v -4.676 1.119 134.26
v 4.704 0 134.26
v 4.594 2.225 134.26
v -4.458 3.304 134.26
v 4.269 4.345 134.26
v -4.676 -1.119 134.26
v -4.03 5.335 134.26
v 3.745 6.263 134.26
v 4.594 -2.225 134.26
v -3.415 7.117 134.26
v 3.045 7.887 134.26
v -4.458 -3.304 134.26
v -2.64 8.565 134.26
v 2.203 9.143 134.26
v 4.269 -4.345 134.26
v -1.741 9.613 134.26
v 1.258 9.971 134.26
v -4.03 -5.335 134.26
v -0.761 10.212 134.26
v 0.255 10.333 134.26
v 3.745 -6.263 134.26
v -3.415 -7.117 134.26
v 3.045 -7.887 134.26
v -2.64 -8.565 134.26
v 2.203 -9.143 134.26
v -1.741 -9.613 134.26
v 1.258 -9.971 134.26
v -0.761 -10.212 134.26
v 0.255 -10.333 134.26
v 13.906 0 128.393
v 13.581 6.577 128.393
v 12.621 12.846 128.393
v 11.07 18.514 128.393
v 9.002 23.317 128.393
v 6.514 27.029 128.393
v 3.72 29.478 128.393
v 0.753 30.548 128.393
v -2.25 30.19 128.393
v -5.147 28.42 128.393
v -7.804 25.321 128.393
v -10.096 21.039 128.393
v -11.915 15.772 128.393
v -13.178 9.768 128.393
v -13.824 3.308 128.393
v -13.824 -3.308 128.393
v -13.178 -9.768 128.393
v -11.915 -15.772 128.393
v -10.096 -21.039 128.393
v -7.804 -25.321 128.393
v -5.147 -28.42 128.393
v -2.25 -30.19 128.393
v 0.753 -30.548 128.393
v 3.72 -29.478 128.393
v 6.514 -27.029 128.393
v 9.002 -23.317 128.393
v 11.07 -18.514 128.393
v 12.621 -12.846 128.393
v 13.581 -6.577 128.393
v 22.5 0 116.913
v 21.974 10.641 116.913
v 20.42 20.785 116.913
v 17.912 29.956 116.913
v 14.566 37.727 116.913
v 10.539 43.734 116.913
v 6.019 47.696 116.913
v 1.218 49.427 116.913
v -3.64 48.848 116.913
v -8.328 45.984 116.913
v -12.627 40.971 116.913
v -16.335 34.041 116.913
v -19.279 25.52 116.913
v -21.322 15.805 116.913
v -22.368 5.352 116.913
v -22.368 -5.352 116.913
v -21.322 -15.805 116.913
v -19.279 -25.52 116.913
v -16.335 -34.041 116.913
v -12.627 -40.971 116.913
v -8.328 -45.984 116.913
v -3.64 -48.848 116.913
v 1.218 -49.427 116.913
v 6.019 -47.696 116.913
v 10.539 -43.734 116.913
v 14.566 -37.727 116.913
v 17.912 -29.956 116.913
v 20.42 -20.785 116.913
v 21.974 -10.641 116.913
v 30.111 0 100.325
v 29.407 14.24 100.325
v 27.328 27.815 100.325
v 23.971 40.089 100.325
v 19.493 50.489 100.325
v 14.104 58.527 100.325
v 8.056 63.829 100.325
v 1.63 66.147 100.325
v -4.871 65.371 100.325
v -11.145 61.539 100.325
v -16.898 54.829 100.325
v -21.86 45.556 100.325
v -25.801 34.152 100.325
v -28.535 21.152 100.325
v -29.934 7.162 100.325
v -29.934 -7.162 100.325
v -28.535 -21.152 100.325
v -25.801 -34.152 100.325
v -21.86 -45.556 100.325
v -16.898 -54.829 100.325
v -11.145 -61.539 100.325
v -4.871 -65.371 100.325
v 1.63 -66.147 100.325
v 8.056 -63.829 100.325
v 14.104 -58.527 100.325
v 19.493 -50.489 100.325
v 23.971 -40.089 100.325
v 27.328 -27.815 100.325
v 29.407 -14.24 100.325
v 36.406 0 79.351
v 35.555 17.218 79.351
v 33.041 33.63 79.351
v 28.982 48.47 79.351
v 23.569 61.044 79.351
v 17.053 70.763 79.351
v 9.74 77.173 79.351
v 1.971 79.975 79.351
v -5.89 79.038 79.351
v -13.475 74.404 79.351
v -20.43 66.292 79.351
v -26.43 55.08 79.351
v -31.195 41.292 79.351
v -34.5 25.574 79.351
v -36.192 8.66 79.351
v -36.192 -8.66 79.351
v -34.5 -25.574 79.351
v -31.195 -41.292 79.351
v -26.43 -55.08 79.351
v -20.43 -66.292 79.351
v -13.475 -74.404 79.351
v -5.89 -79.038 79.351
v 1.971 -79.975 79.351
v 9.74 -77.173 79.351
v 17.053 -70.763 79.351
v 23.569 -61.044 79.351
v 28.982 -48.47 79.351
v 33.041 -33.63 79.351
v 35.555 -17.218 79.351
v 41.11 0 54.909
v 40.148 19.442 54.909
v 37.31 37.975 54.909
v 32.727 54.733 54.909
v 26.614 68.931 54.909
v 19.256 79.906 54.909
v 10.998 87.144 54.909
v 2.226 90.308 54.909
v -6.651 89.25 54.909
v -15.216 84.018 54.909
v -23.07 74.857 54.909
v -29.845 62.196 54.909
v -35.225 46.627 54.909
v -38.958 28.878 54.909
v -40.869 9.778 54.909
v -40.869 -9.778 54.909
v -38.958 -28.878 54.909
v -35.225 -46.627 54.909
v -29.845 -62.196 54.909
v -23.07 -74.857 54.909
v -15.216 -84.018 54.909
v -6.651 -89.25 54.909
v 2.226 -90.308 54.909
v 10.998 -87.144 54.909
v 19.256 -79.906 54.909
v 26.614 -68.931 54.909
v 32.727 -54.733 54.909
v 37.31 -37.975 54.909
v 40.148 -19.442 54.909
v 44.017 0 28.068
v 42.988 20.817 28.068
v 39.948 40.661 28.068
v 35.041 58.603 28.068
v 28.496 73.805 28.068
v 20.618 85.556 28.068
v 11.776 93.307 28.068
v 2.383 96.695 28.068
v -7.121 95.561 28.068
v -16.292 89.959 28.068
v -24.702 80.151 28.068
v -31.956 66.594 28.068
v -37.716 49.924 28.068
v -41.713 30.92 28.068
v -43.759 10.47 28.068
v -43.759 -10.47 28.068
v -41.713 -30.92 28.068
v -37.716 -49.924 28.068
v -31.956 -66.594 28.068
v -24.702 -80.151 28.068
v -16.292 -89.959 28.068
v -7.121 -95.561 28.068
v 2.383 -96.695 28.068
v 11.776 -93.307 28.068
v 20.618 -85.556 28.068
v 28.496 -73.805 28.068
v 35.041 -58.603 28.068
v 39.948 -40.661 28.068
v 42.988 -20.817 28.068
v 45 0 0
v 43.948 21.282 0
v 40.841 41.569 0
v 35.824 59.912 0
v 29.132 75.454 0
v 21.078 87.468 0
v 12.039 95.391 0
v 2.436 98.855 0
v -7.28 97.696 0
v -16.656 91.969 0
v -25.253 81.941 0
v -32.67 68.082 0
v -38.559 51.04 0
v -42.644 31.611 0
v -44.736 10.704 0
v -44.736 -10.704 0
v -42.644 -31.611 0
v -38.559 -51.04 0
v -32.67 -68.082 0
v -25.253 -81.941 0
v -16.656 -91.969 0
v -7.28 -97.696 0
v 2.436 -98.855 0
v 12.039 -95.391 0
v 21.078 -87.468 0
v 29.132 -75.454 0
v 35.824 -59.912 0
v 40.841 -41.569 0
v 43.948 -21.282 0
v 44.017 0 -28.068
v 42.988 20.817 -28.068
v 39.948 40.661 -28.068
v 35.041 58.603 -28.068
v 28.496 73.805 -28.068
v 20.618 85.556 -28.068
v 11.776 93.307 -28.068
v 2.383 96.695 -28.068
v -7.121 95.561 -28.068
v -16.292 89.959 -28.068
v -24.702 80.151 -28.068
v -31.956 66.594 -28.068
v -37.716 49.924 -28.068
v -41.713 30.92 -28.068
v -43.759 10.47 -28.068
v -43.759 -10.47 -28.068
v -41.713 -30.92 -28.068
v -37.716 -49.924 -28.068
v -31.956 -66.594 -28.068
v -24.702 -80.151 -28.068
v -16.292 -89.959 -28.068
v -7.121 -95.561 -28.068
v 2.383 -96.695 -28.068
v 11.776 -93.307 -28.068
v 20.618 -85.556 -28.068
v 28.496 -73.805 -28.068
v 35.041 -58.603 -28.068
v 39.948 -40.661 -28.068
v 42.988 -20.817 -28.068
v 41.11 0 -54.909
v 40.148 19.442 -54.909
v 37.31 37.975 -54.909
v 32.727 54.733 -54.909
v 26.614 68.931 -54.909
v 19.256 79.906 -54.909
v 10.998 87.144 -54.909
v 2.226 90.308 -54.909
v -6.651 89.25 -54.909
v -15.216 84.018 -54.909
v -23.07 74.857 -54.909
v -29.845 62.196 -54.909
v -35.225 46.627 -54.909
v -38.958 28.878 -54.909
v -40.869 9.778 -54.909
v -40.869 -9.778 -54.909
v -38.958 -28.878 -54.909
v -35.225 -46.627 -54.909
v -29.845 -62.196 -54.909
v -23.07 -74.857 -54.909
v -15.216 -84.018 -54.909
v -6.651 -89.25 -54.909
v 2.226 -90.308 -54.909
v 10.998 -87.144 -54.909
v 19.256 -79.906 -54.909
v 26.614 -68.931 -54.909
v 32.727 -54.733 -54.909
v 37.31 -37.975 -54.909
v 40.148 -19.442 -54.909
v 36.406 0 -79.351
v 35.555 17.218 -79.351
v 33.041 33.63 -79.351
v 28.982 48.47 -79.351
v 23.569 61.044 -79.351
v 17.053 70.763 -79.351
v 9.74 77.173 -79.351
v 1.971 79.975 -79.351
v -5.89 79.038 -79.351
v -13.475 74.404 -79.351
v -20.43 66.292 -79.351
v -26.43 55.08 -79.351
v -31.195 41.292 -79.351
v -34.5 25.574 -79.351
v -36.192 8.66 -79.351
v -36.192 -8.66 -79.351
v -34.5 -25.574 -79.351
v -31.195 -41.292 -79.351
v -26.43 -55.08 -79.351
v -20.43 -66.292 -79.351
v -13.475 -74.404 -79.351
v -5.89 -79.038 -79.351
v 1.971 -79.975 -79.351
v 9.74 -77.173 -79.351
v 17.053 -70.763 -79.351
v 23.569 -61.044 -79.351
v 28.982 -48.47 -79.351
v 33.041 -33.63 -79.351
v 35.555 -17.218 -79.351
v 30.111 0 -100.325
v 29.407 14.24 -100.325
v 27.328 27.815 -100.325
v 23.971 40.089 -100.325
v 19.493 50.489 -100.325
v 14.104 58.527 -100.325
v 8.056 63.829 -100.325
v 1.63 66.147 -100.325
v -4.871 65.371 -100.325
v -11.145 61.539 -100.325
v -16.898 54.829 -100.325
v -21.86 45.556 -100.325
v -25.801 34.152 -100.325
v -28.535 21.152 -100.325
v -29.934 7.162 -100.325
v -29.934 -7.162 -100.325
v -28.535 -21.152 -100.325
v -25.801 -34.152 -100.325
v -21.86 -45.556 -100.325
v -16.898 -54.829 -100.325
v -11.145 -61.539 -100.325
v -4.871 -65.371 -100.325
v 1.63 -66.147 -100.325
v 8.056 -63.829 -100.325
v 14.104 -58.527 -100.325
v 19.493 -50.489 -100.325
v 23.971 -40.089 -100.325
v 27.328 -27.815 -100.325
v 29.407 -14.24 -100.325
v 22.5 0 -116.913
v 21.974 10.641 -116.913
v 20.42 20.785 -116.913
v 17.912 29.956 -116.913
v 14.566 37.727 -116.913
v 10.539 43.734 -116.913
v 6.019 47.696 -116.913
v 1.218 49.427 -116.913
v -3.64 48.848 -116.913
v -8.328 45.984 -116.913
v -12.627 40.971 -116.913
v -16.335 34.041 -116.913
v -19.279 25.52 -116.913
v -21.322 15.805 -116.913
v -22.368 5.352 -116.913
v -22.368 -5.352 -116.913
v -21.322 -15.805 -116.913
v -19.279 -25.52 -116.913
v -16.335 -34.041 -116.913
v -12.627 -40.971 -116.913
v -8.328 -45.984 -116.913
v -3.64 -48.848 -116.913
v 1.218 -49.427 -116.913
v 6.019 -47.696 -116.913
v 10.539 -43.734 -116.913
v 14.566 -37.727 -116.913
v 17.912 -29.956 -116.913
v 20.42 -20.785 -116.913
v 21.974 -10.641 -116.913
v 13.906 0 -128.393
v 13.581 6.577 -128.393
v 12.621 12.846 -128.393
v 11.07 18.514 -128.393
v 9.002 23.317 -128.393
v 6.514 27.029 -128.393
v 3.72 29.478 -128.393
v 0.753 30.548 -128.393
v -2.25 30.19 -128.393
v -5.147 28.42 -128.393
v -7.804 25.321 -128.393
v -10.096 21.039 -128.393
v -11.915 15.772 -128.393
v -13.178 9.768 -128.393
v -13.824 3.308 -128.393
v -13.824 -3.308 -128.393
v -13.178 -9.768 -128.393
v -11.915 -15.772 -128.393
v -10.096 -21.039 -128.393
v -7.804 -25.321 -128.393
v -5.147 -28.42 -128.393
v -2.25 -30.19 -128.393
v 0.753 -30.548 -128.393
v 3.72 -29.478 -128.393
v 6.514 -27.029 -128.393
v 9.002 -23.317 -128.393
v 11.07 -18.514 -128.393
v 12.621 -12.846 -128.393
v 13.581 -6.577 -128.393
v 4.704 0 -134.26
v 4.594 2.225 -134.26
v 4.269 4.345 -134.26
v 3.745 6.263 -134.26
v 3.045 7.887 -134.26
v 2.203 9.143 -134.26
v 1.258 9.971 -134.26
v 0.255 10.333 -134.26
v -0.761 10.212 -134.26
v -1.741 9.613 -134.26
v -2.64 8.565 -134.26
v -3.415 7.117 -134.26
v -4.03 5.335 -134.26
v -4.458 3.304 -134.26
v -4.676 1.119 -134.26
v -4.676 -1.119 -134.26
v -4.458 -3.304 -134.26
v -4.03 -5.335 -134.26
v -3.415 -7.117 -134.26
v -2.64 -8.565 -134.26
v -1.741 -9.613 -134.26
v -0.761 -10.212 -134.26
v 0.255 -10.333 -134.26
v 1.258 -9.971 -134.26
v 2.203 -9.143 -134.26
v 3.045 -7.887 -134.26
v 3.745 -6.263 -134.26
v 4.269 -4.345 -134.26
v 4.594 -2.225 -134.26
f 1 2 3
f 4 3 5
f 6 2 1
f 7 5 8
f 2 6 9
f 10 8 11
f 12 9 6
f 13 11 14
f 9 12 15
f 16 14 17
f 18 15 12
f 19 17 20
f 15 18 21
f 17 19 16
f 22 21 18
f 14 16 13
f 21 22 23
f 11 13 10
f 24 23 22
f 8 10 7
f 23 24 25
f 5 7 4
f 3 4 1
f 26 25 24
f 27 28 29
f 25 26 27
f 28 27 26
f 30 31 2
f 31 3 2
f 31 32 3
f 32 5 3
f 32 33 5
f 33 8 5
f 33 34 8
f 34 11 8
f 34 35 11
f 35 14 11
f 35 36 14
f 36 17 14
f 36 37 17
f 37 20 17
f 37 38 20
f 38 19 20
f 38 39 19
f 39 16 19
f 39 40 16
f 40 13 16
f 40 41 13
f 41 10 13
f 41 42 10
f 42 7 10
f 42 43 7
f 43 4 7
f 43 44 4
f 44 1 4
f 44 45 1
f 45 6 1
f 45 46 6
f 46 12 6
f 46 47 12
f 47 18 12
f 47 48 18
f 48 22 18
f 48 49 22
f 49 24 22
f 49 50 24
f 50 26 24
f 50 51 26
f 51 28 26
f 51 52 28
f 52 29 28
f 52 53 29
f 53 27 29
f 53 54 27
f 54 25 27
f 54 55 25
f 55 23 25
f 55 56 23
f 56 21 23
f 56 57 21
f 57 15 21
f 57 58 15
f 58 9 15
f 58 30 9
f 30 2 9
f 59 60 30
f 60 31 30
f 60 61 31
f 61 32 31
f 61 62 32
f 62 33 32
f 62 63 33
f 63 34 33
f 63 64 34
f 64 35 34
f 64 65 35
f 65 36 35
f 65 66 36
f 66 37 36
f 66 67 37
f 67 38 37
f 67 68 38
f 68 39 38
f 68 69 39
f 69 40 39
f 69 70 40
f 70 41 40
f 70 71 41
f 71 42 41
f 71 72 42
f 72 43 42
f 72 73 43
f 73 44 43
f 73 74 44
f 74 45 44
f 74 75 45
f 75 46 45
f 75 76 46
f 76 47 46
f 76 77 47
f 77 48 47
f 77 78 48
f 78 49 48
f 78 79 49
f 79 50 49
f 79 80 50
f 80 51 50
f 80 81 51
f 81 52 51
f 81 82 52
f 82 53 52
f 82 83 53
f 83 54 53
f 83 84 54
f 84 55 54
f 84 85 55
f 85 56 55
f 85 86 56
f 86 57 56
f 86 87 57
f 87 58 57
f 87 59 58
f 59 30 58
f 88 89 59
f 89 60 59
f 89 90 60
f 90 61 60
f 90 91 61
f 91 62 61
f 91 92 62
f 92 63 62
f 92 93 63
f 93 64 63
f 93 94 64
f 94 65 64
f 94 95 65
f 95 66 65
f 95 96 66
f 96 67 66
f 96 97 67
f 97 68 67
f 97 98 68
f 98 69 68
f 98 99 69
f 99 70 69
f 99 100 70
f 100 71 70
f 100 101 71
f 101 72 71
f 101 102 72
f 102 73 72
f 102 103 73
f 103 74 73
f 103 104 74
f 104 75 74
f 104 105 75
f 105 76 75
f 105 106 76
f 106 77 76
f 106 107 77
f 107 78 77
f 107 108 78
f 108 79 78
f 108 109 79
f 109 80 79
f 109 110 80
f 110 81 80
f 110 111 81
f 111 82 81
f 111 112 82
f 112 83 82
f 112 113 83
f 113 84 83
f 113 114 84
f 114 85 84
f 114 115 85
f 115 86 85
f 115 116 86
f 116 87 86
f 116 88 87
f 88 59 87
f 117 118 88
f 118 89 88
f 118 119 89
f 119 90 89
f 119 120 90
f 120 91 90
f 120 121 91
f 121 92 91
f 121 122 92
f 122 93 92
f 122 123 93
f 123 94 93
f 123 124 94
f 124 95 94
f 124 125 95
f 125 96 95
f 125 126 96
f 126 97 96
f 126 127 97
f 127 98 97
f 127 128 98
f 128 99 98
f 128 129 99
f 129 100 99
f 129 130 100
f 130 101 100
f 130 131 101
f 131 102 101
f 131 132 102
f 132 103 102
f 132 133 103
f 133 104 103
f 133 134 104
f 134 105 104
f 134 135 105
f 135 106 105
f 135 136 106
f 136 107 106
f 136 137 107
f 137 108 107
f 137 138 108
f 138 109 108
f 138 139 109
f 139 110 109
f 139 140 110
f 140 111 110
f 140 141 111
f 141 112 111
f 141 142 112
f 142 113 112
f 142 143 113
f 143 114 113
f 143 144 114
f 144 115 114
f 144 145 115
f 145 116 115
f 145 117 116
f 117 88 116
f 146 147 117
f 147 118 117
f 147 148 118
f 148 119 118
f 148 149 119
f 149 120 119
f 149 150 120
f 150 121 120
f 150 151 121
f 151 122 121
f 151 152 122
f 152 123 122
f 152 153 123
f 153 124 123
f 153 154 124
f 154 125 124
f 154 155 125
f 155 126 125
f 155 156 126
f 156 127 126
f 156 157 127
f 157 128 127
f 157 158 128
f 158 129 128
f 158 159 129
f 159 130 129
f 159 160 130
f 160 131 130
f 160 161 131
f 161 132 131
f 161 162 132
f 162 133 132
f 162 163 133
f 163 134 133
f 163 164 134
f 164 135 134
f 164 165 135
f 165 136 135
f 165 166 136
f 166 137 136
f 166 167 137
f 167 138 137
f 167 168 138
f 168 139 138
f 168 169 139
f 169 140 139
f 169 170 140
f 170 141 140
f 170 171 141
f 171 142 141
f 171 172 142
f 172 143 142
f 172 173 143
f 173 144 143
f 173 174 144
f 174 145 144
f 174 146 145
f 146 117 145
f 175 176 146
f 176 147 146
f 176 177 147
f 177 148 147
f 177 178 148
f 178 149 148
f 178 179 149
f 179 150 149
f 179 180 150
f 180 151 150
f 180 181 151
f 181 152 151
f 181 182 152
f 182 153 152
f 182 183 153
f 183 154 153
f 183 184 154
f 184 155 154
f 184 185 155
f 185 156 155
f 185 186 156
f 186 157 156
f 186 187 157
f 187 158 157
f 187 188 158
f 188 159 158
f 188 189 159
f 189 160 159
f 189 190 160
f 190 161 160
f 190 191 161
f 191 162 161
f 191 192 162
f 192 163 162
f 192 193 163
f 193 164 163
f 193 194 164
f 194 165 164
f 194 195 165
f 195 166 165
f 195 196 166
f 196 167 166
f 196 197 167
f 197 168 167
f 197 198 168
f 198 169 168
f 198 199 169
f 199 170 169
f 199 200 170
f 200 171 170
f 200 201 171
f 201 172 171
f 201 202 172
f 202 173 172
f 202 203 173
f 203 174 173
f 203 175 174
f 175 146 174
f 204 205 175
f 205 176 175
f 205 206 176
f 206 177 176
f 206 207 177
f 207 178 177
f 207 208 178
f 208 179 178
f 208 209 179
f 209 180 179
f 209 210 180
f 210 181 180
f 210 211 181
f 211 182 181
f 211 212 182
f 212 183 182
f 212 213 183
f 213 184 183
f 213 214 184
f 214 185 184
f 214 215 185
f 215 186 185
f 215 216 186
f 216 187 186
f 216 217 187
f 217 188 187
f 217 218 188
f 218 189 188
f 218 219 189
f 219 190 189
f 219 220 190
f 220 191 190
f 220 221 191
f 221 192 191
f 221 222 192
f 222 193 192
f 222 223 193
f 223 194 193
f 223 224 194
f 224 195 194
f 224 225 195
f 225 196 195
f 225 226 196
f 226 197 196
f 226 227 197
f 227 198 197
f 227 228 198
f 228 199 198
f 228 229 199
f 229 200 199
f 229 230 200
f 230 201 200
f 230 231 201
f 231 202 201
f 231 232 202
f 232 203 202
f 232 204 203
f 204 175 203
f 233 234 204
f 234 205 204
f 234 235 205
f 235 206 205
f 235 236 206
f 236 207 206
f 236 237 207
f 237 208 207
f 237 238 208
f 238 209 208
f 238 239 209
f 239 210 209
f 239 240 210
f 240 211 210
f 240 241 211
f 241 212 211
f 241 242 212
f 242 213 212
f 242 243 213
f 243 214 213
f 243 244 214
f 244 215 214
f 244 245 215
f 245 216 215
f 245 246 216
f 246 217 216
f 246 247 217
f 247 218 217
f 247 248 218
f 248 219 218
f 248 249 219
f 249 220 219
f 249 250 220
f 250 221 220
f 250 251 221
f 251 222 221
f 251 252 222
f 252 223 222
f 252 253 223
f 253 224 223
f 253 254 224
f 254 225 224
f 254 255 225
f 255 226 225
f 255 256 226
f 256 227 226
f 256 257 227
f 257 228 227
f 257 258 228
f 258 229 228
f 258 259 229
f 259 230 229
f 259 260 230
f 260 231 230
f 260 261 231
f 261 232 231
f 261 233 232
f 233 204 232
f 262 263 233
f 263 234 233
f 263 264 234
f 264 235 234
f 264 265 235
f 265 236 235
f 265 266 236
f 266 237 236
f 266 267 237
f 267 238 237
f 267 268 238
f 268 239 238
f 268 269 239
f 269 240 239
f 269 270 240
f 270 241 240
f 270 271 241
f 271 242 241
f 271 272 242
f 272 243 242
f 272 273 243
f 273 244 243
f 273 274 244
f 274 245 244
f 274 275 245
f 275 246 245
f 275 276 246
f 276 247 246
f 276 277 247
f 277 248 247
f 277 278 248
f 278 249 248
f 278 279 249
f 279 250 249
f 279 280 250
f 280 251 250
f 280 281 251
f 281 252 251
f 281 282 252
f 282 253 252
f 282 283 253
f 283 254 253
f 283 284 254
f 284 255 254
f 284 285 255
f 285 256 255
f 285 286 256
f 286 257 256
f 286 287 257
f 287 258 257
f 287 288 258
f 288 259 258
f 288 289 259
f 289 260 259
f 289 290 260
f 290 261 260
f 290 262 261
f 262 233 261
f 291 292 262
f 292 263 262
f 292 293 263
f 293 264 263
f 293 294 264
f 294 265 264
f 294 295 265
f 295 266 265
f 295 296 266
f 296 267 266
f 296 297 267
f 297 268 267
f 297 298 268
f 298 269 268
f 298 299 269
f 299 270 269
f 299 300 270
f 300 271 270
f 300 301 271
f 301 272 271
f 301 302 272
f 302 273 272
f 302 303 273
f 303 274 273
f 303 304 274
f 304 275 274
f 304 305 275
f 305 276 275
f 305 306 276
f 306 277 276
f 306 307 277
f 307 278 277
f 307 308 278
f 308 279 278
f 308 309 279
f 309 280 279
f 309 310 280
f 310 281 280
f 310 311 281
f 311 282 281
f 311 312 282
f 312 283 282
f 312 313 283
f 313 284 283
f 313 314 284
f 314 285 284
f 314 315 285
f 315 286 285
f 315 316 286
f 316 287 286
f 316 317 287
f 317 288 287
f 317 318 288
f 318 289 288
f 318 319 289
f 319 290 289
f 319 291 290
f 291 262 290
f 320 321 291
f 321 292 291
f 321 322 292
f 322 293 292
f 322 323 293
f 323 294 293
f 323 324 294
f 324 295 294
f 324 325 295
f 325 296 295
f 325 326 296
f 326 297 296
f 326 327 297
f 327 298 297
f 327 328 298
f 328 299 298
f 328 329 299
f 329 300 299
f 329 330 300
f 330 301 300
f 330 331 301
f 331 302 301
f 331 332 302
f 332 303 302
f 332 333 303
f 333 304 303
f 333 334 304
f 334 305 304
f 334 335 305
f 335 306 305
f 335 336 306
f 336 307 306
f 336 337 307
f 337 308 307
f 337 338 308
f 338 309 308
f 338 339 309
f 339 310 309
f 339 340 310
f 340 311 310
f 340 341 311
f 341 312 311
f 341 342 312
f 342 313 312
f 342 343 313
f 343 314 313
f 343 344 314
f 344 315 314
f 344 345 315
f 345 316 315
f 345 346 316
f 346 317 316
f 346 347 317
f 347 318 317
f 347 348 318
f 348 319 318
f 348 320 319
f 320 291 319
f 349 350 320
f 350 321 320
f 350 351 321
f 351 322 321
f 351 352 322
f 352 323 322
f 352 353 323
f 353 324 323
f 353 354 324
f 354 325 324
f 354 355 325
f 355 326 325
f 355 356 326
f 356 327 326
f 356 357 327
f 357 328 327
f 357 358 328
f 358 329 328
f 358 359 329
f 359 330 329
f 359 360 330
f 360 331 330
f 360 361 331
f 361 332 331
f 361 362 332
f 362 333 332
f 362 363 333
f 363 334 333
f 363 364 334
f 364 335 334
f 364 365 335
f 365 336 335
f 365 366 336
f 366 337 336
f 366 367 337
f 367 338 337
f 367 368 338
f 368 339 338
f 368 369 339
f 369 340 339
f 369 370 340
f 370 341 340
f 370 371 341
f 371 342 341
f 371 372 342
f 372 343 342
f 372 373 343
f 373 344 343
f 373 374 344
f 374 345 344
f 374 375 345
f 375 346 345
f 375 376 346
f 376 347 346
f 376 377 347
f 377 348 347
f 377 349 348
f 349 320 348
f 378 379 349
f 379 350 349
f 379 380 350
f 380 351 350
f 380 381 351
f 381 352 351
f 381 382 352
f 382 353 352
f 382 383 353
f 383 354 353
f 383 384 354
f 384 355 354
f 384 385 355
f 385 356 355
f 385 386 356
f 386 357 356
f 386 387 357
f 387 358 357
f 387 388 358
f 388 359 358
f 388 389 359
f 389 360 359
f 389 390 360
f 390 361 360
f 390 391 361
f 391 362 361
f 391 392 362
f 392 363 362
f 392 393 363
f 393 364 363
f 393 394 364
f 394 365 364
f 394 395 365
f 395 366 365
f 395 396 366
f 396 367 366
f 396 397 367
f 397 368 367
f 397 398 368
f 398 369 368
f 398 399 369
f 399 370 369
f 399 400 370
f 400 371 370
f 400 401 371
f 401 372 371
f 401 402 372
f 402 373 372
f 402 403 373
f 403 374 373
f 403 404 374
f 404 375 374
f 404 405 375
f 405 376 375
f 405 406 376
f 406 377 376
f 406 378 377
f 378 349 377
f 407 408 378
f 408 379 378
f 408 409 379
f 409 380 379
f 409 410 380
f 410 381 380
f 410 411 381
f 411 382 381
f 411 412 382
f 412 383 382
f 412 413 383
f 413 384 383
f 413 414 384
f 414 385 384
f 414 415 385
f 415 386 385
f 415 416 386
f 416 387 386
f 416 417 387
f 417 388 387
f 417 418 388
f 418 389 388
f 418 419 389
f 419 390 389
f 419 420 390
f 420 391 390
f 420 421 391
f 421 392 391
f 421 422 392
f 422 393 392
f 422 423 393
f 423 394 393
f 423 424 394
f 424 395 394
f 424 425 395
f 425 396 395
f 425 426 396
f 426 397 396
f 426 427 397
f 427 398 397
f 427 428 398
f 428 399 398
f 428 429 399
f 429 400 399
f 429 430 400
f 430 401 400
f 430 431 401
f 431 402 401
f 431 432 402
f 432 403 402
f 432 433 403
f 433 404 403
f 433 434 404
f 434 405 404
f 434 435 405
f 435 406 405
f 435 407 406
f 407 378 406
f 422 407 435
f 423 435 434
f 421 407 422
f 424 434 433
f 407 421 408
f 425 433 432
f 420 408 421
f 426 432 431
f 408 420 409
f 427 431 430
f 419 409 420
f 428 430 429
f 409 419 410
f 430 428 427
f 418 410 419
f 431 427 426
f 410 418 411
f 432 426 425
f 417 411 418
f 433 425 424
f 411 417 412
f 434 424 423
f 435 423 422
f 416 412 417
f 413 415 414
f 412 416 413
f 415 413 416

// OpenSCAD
// Generated by SolidPython 1.0.1 on 2020-07-29 00:46:46


scale(v = [5, 11, 15]) {
	sphere(r = 9);
}
/***********************************************
*********      SolidPython code:      **********
************************************************
 
# import packages: SolidPython
from solid import *
from solid.utils import *
from itertools import chain, combinations, permutations


class Resize:

    def __init__(self, scad_file):
        self.scad_file = scad_file
        #self.scad_file = import_scad(scad_file)
        # cone/cylinder param:
        self.r1 = 0
        self.r2 = 0
        self.h = 0
        # rectangular prism param:
        self.w = 0
        self.l = 0
        # ellipse param:
        self.r = 0

    # import OpenScad code (file name corresponds to shape)


    # classify shape + parameters
    def assign(self, param1, param2, param3):
        if self.scad_file == 'cone.scad':
            self.r1 = param1
            self.r2 = param2
            self.h = param3
        elif self.scad_file == 'cylinder.scad':
            self.r1 = param1
            self.r2 = param2
            self.h = param3
        elif self.scad_file == 'rectangularPrism.scad':
            self.h = param1
            self.l = param2
            self.w = param3
        else:
            self.r = param1
            self.h = param2

    # resize parameters
    def iterate(self):
        x = range(3, 20, 2)
        i = 1
        if self.scad_file == 'cone.scad':
            tempList = list(permutations(x, 2))
            for temp in tempList:
                param1 = temp[0]
                param2 = temp[1]
                filepath = 'produced_scad_files/' + 'cone' + str(param1) + '_' + str(param2) + '_' + '.scad'
                scad_render_to_file(cylinder(h=param1, r1=param2, r2=0), filepath)

        elif self.scad_file == 'cylinder.scad':
            tempList = list(permutations(x, 3))
            for temp in tempList:
                param1 = temp[0]
                param2 = temp[1]
                filepath = 'produced_scad_files/' + 'cylinder' + str(param1) + '_' + str(param2) + '_' + '.scad'
                scad_render_to_file(cylinder(h=param1, r1=param2, r2=param2), filepath)

        elif self.scad_file == 'rectangularPrism.scad':
            tempList = list(permutations(x, 3))
            for temp in tempList:
                param1 = temp[0]
                param2 = temp[1]
                param3 = temp[2]
                filepath = 'produced_scad_files/' + 'rectangularPrism' + str(param1) + '_' + str(param2) + '_' + str(
                    param3) + '.scad'
                scad_render_to_file(cube(size=(param1, param2, param3)), filepath)

        elif self.scad_file == 'ellipse.scad':
            tempList = list(permutations(x, 4))
            for temp in tempList:
                param1 = temp[0]
                param2 = temp[1]
                param3 = temp[2]
                param4 = temp[3]
                filepath = 'produced_scad_files/' + 'ellipse' + str(param1) + '_' + str(param2) + '_' + str(param3) + '_' + str(param4) + '.scad'
                scad_render_to_file(scale([param1, param2, param3])(sphere(r=param4)), filepath)

    def render_to_scadfile(self):
        scad_render_to_file(scad, 'example.scad') 
 
************************************************/
